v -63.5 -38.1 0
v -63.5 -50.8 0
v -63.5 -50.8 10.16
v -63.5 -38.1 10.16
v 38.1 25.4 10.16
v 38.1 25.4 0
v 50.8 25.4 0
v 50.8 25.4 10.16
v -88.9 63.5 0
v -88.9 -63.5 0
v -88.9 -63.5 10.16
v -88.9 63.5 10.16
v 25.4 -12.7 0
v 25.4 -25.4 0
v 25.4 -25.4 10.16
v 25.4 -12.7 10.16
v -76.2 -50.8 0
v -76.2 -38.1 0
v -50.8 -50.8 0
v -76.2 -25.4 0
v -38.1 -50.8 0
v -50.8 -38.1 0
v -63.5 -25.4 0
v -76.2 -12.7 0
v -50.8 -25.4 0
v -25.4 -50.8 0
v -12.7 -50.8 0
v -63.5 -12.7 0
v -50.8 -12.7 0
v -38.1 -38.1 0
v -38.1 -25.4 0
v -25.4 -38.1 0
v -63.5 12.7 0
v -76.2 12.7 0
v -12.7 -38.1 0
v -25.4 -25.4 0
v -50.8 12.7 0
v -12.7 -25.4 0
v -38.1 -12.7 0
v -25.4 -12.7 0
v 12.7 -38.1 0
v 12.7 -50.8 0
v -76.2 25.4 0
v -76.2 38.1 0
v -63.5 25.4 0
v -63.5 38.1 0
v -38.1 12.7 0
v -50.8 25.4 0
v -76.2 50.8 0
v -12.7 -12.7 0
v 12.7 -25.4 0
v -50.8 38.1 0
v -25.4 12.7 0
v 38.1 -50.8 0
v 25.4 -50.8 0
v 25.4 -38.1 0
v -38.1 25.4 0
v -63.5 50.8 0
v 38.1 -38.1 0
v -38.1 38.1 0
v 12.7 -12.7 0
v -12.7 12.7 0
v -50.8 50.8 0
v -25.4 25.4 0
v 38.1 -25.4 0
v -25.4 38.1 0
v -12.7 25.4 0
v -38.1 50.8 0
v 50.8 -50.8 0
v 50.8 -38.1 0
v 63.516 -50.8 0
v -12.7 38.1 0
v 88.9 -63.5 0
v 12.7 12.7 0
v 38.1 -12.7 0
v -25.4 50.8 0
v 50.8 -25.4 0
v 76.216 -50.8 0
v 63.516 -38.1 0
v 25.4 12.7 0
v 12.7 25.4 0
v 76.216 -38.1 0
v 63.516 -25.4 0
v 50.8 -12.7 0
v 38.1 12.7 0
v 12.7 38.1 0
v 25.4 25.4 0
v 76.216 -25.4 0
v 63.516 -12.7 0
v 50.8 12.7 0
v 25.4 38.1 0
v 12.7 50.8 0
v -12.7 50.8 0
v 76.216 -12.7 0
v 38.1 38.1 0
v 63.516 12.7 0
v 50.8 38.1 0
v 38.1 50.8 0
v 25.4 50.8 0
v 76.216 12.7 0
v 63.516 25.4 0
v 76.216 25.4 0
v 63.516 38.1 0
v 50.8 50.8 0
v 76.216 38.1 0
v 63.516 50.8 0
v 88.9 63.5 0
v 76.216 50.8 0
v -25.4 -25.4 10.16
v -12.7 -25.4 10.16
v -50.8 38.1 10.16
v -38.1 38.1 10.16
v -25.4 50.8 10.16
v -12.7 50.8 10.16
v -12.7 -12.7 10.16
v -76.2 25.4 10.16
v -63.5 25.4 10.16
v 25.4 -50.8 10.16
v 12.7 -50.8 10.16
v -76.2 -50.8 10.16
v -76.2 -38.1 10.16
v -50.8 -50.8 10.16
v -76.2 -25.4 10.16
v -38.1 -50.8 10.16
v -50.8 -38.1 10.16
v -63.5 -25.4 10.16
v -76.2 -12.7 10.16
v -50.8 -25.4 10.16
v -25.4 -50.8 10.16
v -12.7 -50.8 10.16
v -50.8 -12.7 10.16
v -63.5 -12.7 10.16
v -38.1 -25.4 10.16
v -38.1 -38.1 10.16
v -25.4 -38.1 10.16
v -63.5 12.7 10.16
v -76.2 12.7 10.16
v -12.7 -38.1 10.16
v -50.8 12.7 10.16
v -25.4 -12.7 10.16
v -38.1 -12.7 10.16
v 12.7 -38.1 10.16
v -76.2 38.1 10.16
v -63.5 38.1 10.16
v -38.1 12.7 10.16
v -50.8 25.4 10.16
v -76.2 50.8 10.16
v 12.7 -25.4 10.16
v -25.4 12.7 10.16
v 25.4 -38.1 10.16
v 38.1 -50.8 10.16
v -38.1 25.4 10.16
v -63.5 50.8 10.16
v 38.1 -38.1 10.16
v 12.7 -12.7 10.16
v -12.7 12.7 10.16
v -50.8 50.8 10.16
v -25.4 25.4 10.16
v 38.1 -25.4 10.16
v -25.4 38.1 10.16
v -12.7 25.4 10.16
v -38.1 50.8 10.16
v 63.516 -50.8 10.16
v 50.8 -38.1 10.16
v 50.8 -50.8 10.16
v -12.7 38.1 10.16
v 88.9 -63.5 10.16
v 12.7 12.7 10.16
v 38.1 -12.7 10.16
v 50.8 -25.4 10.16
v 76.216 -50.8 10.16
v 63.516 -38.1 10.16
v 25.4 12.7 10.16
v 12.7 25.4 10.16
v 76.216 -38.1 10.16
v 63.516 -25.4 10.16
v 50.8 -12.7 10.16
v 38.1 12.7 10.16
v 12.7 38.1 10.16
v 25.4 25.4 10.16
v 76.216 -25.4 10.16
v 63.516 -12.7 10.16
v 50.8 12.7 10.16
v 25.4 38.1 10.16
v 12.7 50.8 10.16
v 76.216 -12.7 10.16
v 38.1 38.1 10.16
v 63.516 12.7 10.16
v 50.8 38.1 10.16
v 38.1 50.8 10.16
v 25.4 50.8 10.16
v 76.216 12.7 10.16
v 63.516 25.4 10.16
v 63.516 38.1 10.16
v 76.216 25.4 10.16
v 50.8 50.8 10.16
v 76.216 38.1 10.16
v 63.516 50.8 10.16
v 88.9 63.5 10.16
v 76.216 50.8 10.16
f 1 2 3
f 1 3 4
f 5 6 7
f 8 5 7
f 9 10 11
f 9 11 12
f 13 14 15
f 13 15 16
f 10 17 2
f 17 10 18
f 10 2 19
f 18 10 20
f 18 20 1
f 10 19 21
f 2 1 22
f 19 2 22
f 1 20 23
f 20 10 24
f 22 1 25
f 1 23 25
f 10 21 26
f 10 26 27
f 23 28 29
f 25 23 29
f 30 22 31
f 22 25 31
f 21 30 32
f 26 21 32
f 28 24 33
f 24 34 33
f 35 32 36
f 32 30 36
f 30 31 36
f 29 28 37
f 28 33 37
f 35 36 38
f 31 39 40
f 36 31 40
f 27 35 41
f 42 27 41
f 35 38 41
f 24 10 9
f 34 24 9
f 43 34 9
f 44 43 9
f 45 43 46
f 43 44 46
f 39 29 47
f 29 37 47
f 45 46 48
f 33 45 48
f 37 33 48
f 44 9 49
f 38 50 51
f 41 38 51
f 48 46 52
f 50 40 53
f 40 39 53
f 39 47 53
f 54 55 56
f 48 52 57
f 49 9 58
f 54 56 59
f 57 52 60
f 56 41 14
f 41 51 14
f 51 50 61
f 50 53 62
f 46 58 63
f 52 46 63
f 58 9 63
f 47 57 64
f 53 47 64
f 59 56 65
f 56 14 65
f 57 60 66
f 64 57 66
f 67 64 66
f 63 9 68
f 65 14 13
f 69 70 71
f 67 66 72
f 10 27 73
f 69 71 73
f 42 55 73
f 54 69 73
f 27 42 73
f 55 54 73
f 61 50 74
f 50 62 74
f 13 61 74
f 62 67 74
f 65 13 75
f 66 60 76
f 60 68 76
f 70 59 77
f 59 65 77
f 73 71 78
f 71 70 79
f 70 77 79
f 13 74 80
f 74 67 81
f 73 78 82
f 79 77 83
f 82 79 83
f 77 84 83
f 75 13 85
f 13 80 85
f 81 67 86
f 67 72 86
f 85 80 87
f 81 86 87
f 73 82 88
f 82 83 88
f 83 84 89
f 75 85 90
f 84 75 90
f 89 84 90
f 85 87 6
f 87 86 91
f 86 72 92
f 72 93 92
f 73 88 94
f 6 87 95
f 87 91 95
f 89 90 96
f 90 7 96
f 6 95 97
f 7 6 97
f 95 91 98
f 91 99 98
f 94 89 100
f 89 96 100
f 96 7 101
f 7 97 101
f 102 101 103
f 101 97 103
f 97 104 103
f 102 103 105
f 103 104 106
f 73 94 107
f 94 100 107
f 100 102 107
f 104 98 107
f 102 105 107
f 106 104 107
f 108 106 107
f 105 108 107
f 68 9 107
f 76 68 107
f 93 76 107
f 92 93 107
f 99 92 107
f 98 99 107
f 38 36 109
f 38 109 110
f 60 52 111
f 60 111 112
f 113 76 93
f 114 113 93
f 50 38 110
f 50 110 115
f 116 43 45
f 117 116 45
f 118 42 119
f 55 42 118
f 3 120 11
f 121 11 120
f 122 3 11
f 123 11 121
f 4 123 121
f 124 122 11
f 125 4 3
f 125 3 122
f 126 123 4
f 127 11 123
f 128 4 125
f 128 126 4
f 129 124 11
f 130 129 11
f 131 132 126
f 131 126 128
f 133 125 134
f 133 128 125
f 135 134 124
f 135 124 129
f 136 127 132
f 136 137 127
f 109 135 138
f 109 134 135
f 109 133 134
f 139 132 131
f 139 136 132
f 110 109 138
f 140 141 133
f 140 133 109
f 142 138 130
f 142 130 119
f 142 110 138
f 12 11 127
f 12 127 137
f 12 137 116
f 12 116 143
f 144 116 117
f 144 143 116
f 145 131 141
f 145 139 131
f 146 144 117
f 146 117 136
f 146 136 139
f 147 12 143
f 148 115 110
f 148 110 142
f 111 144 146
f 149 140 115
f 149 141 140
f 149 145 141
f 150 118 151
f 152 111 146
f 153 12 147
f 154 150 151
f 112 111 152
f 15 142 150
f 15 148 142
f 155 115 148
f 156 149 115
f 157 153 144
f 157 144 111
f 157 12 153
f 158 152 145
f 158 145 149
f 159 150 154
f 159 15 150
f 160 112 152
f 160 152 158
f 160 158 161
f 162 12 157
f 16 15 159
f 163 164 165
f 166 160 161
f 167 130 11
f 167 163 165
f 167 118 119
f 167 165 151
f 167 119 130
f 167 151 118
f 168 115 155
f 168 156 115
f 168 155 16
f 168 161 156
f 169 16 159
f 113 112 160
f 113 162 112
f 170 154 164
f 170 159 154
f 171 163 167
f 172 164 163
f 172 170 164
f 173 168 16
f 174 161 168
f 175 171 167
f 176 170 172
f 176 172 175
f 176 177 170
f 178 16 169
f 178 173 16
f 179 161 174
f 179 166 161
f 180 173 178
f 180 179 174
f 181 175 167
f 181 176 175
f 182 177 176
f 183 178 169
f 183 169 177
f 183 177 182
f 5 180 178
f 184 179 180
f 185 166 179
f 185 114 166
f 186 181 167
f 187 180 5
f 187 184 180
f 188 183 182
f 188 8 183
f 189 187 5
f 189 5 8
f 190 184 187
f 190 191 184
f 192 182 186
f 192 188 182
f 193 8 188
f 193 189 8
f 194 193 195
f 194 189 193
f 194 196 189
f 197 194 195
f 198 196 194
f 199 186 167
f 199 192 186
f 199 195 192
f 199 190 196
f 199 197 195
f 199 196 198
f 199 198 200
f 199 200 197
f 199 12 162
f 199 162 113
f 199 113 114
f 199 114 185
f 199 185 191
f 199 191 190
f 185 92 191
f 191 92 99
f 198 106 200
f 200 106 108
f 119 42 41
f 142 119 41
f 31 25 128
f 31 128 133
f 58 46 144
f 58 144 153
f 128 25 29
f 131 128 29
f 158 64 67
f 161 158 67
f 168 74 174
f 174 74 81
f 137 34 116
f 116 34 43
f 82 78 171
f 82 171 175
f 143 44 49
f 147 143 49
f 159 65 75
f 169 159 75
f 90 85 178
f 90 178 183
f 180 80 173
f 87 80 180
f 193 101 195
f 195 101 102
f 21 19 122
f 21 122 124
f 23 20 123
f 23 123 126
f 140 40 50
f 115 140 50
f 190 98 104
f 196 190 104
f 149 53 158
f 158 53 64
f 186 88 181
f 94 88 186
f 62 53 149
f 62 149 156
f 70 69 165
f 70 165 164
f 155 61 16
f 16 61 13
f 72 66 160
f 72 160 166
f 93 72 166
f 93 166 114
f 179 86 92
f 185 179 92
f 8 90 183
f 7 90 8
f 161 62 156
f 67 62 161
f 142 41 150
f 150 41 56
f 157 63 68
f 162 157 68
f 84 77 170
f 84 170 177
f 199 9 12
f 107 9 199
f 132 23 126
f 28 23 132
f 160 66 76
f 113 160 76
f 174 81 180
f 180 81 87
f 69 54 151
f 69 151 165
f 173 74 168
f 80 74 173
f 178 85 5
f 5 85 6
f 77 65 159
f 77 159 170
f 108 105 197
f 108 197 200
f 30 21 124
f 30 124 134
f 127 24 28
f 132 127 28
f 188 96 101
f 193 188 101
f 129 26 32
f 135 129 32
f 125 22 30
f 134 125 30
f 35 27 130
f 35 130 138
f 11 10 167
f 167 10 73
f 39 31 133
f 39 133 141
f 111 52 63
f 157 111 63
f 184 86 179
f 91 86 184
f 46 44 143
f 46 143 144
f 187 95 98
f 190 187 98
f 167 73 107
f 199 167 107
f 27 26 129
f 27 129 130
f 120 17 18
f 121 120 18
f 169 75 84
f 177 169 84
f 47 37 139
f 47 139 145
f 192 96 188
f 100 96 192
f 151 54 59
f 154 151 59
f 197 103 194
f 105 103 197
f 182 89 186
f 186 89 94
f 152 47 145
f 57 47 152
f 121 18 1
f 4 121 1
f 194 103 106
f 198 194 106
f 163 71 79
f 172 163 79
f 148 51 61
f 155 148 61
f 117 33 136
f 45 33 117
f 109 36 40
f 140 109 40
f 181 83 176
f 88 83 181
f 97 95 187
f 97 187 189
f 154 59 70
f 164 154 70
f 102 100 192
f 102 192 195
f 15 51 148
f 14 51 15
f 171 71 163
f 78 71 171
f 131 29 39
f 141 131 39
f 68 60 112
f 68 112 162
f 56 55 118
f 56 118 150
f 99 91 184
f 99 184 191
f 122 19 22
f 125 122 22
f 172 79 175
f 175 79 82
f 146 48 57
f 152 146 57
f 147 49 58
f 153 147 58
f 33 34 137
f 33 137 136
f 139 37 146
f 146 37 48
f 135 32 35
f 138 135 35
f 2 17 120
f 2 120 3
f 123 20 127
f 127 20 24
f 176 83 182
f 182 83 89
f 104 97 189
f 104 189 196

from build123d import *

# Parameters (mm, degrees)
F0_W     = 177.8
F0_H     = 127
F0_W_2   = 12.7
F0_H_2   = 12.7
F1_DEPTH = 10.16


with BuildPart() as f1:
    # F0 (on Top) → F1 (new body)
    with BuildSketch(Plane.XY):
        Rectangle(F0_W, F0_H)
        with Locations((-69.85, -44.449999)):
            Rectangle(F0_W_2, F0_H_2, mode=Mode.SUBTRACT)
        with Locations((-44.45, -44.45)):
            Rectangle(F0_W_2, F0_H_2, mode=Mode.SUBTRACT)
        with Locations((-19.05, -44.45)):
            Rectangle(F0_W_2, F0_H_2, mode=Mode.SUBTRACT)
        with Locations((-69.85, -19.049999)):
            Rectangle(F0_W_2, F0_H_2, mode=Mode.SUBTRACT)
        with Locations((-44.45, -19.05)):
            Rectangle(F0_W_2, F0_H_2, mode=Mode.SUBTRACT)
        with Locations((-19.05, -19.05)):
            Rectangle(F0_W_2, F0_H_2, mode=Mode.SUBTRACT)
        with Locations((19.05, -44.45)):
            Rectangle(F0_W_2, F0_H_2, mode=Mode.SUBTRACT)
        with Locations((44.45, -44.45)):
            Rectangle(F0_W_2, F0_H_2, mode=Mode.SUBTRACT)
        with Locations((69.865507, -44.449999)):
            Rectangle(F0_W_2, F0_H_2, mode=Mode.SUBTRACT)
        with Locations((19.05, -19.05)):
            Rectangle(F0_W_2, F0_H_2, mode=Mode.SUBTRACT)
        with Locations((44.45, -19.05)):
            Rectangle(F0_W_2, F0_H_2, mode=Mode.SUBTRACT)
        with Locations((69.865507, -19.049999)):
            Rectangle(F0_W_2, F0_H_2, mode=Mode.SUBTRACT)
        with Locations((-69.85, 19.05)):
            Rectangle(F0_W_2, F0_H_2, mode=Mode.SUBTRACT)
        with Locations((-44.45, 19.05)):
            Rectangle(F0_W_2, F0_H_2, mode=Mode.SUBTRACT)
        with Locations((-19.05, 19.05)):
            Rectangle(F0_W_2, F0_H_2, mode=Mode.SUBTRACT)
        with Locations((-69.85, 44.45)):
            Rectangle(F0_W_2, F0_H_2, mode=Mode.SUBTRACT)
        with Locations((-44.45, 44.45)):
            Rectangle(F0_W_2, F0_H_2, mode=Mode.SUBTRACT)
        with Locations((-19.05, 44.45)):
            Rectangle(F0_W_2, F0_H_2, mode=Mode.SUBTRACT)
        with Locations((19.05, 19.05)):
            Rectangle(F0_W_2, F0_H_2, mode=Mode.SUBTRACT)
        with Locations((44.45, 19.05)):
            Rectangle(F0_W_2, F0_H_2, mode=Mode.SUBTRACT)
        with Locations((69.865507, 19.050001)):
            Rectangle(F0_W_2, F0_H_2, mode=Mode.SUBTRACT)
        with Locations((19.05, 44.45)):
            Rectangle(F0_W_2, F0_H_2, mode=Mode.SUBTRACT)
        with Locations((44.45, 44.45)):
            Rectangle(F0_W_2, F0_H_2, mode=Mode.SUBTRACT)
        with Locations((69.865507, 44.450001)):
            Rectangle(F0_W_2, F0_H_2, mode=Mode.SUBTRACT)
    extrude(amount=F1_DEPTH)


solid = f1.part
